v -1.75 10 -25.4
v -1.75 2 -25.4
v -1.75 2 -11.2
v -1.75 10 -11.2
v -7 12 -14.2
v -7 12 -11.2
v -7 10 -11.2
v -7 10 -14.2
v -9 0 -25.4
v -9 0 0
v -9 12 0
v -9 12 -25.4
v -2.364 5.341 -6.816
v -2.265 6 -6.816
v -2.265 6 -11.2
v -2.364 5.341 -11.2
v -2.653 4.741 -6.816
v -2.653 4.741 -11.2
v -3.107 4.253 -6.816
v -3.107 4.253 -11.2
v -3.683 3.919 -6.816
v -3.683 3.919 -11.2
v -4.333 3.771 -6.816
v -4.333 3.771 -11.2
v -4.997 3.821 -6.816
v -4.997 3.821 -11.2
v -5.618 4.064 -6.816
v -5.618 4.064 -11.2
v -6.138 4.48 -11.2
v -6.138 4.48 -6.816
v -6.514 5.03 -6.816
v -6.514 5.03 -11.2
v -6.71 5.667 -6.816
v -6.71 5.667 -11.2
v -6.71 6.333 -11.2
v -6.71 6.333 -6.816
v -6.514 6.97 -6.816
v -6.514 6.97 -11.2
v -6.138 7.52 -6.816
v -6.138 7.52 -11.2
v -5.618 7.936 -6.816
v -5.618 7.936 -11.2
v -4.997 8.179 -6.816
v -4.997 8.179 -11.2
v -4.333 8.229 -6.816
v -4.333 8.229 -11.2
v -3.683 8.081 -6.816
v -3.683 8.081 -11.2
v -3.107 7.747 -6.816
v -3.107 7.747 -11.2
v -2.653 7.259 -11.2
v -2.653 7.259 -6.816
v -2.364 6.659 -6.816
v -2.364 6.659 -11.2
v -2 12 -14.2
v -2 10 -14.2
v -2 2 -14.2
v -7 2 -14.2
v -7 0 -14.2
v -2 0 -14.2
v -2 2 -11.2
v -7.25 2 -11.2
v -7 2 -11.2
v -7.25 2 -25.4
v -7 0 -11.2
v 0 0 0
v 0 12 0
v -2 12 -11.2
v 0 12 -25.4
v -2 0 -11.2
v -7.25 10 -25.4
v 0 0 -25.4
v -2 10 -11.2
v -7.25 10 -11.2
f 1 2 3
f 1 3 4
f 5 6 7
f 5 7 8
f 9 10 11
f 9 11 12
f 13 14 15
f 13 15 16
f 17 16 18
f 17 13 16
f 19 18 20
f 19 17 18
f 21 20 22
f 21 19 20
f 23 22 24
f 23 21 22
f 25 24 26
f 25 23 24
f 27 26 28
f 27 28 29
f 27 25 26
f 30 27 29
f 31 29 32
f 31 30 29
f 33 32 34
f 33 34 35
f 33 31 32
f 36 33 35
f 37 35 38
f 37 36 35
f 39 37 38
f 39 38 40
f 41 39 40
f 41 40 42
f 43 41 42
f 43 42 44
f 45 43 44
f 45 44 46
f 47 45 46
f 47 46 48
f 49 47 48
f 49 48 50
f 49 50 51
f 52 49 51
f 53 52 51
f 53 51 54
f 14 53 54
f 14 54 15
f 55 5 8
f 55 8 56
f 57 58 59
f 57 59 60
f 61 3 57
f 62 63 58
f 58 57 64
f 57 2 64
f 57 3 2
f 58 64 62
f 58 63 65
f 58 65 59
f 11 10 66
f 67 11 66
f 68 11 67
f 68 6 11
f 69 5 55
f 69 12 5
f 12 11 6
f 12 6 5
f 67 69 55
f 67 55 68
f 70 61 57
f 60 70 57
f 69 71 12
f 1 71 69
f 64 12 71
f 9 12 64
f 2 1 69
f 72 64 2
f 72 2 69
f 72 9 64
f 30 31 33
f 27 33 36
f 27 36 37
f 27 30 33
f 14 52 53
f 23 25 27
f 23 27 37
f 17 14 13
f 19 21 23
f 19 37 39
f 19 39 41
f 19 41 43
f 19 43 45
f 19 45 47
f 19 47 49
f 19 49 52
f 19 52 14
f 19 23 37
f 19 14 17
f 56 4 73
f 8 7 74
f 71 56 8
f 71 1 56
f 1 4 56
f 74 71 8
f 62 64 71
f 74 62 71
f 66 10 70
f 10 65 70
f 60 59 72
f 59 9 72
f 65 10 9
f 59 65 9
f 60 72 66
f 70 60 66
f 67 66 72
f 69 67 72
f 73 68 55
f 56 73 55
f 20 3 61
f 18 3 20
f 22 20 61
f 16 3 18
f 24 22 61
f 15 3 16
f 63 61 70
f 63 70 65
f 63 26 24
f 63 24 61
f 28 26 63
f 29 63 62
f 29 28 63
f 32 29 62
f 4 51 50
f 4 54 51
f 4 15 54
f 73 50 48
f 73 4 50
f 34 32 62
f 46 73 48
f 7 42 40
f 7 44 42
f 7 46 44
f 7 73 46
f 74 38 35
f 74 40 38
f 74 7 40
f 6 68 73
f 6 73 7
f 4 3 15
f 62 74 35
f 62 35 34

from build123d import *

# Parameters (mm, degrees)
SKETCH1_W           = 9
SKETCH1_H           = 25.4
BOSS_EXTRUDE1_DEPTH = 12
SKETCH2_W           = 5
SKETCH2_H           = 3
CUT_EXTRUDE1_DEPTH  = 30.498474537
SKETCH4_W           = 5.5
SKETCH4_H           = 8
CUT_EXTRUDE2_DEPTH  = 22
SKETCH7_W           = 5.5
SKETCH7_H           = 8
SKETCH7_R           = 2.235
BOSS_EXTRUDE3_DEPTH = 7.8
SKETCH8_R           = 2.235
BOSS_EXTRUDE4_DEPTH = 3.4162


with BuildPart() as part:
    # Sketch1 → Boss-Extrude1 (new body)
    with BuildSketch(Plane(origin=(0, 0, 0), x_dir=(1, 0, 0), z_dir=(0, 1, 0))):
        with Locations((-4.5, 12.7)):
            Rectangle(SKETCH1_W, SKETCH1_H)
    extrude(amount=BOSS_EXTRUDE1_DEPTH)

    # Sketch2 → Cut-Extrude1 (cut, through all)
    with BuildSketch(Plane(origin=(0, 12, 0), x_dir=(1, 0, 0), z_dir=(0, 1, 0))):
        with Locations((-4.5, 12.7)):
            Rectangle(SKETCH2_W, SKETCH2_H)
    extrude(amount=-CUT_EXTRUDE1_DEPTH, mode=Mode.SUBTRACT)

    # Sketch4 → Cut-Extrude2 (cut)
    with BuildSketch(Plane(origin=(0, 0, -25.4), x_dir=(-1, 0, 0), z_dir=(0, 0, -1))):
        with Locations((4.5, 6)):
            Rectangle(SKETCH4_W, SKETCH4_H)
    extrude(amount=-CUT_EXTRUDE2_DEPTH, mode=Mode.SUBTRACT)

    # Sketch7 → Boss-Extrude3 (add)
    with BuildSketch(Plane(origin=(0, 0, -3.4), x_dir=(-1, 0, 0), z_dir=(0, 0, -1))):
        with Locations((4.5, 6)):
            Rectangle(SKETCH7_W, SKETCH7_H)
        with Locations(Location((4.5, 6, 0), (0, 0, 180))):
            Circle(SKETCH7_R, mode=Mode.SUBTRACT)
    extrude(amount=BOSS_EXTRUDE3_DEPTH)

    # Sketch8 → Boss-Extrude4 (add)
    with BuildSketch(Plane(origin=(0, 0, -3.4), x_dir=(-1, 0, 0), z_dir=(0, 0, -1))):
        with Locations(Location((4.5, 6, 0), (0, 0, 180))):
            Circle(SKETCH8_R)
    extrude(amount=BOSS_EXTRUDE4_DEPTH)


solid = part.part
